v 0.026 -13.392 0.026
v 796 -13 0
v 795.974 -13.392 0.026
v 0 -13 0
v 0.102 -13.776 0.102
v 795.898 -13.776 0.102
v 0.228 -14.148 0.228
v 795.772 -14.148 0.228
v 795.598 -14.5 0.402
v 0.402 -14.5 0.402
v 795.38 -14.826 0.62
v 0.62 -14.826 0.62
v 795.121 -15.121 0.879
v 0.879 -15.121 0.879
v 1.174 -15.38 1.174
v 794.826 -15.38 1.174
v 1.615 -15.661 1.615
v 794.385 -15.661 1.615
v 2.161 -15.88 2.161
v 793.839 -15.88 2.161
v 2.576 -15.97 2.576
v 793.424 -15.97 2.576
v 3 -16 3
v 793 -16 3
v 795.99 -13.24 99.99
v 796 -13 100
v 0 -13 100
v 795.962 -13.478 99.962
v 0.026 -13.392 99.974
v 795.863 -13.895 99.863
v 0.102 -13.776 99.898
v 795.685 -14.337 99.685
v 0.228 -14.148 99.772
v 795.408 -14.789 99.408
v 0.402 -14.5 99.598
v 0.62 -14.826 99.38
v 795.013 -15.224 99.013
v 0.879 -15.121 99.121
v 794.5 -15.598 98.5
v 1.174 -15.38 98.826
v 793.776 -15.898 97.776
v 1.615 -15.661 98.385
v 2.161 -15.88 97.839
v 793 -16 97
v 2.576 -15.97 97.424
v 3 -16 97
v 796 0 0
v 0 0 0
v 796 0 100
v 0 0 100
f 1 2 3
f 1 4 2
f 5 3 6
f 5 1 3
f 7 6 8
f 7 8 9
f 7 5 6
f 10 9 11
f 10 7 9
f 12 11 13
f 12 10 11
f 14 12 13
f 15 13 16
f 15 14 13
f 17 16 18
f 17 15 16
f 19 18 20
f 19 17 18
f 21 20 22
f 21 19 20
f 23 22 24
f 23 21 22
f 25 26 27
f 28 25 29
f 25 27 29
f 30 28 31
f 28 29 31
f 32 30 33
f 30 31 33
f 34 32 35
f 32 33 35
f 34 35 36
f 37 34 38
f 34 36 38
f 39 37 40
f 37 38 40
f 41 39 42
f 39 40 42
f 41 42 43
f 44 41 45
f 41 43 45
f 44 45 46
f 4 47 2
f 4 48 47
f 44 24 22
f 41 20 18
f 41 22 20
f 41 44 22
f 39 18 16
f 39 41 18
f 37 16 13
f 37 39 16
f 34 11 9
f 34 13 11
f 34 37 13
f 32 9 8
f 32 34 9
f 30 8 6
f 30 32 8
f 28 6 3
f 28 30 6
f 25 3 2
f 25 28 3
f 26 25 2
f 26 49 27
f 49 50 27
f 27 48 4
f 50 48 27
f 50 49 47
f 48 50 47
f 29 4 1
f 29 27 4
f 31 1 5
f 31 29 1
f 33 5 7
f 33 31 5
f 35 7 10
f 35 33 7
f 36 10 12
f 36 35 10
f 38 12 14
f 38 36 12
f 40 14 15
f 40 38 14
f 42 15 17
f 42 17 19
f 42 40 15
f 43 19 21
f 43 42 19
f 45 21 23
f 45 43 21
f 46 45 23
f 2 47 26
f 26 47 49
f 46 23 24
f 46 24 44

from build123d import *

# Parameters (mm, degrees)
F0_W     = 53.6684691906
F0_H     = 36.3845862448
F1_DEPTH = 16
F2_DEPTH = 396
F3_DEPTH = 100
F4_DEPTH = 200
F5_DEPTH = 200
F6_R     = 3


with BuildPart() as f1:
    # F0 (on Front) → F1 (new body)
    with BuildSketch(Plane.XZ):
        with Locations((26.8342345953, 18.1922931224)):
            Rectangle(F0_W, F0_H)
    extrude(amount=F1_DEPTH)

    # F2 (add): a face of the model
    f2_faces = [f1.faces().sort_by_distance(p)[0] for p in [
        (0, -8, 18.1922931224),
    ]]
    extrude(f2_faces, amount=-F2_DEPTH)

    # F3 (add): a face of the model
    f3_faces = [f1.faces().sort_by_distance(p)[0] for p in [
        (198, -8, 0),
    ]]
    extrude(f3_faces, amount=-F3_DEPTH)

    # F4 (add): a face of the model
    f4_faces = [f1.faces().sort_by_distance(p)[0] for p in [
        (396, -8, 50),
    ]]
    extrude(f4_faces, amount=F4_DEPTH)

    # F5 (add): a face of the model
    f5_faces = [f1.faces().sort_by_distance(p)[0] for p in [
        (596, -8, 50),
    ]]
    extrude(f5_faces, amount=F5_DEPTH)

    # F6
    f6_edges = [f1.edges().sort_by_distance(p)[0] for p in [
        (0, -16, 50),
        (398, -16, 0),
        (796, -16, 50),
        (398, -16, 100),
    ]]
    fillet(f6_edges, radius=F6_R)


solid = f1.part
